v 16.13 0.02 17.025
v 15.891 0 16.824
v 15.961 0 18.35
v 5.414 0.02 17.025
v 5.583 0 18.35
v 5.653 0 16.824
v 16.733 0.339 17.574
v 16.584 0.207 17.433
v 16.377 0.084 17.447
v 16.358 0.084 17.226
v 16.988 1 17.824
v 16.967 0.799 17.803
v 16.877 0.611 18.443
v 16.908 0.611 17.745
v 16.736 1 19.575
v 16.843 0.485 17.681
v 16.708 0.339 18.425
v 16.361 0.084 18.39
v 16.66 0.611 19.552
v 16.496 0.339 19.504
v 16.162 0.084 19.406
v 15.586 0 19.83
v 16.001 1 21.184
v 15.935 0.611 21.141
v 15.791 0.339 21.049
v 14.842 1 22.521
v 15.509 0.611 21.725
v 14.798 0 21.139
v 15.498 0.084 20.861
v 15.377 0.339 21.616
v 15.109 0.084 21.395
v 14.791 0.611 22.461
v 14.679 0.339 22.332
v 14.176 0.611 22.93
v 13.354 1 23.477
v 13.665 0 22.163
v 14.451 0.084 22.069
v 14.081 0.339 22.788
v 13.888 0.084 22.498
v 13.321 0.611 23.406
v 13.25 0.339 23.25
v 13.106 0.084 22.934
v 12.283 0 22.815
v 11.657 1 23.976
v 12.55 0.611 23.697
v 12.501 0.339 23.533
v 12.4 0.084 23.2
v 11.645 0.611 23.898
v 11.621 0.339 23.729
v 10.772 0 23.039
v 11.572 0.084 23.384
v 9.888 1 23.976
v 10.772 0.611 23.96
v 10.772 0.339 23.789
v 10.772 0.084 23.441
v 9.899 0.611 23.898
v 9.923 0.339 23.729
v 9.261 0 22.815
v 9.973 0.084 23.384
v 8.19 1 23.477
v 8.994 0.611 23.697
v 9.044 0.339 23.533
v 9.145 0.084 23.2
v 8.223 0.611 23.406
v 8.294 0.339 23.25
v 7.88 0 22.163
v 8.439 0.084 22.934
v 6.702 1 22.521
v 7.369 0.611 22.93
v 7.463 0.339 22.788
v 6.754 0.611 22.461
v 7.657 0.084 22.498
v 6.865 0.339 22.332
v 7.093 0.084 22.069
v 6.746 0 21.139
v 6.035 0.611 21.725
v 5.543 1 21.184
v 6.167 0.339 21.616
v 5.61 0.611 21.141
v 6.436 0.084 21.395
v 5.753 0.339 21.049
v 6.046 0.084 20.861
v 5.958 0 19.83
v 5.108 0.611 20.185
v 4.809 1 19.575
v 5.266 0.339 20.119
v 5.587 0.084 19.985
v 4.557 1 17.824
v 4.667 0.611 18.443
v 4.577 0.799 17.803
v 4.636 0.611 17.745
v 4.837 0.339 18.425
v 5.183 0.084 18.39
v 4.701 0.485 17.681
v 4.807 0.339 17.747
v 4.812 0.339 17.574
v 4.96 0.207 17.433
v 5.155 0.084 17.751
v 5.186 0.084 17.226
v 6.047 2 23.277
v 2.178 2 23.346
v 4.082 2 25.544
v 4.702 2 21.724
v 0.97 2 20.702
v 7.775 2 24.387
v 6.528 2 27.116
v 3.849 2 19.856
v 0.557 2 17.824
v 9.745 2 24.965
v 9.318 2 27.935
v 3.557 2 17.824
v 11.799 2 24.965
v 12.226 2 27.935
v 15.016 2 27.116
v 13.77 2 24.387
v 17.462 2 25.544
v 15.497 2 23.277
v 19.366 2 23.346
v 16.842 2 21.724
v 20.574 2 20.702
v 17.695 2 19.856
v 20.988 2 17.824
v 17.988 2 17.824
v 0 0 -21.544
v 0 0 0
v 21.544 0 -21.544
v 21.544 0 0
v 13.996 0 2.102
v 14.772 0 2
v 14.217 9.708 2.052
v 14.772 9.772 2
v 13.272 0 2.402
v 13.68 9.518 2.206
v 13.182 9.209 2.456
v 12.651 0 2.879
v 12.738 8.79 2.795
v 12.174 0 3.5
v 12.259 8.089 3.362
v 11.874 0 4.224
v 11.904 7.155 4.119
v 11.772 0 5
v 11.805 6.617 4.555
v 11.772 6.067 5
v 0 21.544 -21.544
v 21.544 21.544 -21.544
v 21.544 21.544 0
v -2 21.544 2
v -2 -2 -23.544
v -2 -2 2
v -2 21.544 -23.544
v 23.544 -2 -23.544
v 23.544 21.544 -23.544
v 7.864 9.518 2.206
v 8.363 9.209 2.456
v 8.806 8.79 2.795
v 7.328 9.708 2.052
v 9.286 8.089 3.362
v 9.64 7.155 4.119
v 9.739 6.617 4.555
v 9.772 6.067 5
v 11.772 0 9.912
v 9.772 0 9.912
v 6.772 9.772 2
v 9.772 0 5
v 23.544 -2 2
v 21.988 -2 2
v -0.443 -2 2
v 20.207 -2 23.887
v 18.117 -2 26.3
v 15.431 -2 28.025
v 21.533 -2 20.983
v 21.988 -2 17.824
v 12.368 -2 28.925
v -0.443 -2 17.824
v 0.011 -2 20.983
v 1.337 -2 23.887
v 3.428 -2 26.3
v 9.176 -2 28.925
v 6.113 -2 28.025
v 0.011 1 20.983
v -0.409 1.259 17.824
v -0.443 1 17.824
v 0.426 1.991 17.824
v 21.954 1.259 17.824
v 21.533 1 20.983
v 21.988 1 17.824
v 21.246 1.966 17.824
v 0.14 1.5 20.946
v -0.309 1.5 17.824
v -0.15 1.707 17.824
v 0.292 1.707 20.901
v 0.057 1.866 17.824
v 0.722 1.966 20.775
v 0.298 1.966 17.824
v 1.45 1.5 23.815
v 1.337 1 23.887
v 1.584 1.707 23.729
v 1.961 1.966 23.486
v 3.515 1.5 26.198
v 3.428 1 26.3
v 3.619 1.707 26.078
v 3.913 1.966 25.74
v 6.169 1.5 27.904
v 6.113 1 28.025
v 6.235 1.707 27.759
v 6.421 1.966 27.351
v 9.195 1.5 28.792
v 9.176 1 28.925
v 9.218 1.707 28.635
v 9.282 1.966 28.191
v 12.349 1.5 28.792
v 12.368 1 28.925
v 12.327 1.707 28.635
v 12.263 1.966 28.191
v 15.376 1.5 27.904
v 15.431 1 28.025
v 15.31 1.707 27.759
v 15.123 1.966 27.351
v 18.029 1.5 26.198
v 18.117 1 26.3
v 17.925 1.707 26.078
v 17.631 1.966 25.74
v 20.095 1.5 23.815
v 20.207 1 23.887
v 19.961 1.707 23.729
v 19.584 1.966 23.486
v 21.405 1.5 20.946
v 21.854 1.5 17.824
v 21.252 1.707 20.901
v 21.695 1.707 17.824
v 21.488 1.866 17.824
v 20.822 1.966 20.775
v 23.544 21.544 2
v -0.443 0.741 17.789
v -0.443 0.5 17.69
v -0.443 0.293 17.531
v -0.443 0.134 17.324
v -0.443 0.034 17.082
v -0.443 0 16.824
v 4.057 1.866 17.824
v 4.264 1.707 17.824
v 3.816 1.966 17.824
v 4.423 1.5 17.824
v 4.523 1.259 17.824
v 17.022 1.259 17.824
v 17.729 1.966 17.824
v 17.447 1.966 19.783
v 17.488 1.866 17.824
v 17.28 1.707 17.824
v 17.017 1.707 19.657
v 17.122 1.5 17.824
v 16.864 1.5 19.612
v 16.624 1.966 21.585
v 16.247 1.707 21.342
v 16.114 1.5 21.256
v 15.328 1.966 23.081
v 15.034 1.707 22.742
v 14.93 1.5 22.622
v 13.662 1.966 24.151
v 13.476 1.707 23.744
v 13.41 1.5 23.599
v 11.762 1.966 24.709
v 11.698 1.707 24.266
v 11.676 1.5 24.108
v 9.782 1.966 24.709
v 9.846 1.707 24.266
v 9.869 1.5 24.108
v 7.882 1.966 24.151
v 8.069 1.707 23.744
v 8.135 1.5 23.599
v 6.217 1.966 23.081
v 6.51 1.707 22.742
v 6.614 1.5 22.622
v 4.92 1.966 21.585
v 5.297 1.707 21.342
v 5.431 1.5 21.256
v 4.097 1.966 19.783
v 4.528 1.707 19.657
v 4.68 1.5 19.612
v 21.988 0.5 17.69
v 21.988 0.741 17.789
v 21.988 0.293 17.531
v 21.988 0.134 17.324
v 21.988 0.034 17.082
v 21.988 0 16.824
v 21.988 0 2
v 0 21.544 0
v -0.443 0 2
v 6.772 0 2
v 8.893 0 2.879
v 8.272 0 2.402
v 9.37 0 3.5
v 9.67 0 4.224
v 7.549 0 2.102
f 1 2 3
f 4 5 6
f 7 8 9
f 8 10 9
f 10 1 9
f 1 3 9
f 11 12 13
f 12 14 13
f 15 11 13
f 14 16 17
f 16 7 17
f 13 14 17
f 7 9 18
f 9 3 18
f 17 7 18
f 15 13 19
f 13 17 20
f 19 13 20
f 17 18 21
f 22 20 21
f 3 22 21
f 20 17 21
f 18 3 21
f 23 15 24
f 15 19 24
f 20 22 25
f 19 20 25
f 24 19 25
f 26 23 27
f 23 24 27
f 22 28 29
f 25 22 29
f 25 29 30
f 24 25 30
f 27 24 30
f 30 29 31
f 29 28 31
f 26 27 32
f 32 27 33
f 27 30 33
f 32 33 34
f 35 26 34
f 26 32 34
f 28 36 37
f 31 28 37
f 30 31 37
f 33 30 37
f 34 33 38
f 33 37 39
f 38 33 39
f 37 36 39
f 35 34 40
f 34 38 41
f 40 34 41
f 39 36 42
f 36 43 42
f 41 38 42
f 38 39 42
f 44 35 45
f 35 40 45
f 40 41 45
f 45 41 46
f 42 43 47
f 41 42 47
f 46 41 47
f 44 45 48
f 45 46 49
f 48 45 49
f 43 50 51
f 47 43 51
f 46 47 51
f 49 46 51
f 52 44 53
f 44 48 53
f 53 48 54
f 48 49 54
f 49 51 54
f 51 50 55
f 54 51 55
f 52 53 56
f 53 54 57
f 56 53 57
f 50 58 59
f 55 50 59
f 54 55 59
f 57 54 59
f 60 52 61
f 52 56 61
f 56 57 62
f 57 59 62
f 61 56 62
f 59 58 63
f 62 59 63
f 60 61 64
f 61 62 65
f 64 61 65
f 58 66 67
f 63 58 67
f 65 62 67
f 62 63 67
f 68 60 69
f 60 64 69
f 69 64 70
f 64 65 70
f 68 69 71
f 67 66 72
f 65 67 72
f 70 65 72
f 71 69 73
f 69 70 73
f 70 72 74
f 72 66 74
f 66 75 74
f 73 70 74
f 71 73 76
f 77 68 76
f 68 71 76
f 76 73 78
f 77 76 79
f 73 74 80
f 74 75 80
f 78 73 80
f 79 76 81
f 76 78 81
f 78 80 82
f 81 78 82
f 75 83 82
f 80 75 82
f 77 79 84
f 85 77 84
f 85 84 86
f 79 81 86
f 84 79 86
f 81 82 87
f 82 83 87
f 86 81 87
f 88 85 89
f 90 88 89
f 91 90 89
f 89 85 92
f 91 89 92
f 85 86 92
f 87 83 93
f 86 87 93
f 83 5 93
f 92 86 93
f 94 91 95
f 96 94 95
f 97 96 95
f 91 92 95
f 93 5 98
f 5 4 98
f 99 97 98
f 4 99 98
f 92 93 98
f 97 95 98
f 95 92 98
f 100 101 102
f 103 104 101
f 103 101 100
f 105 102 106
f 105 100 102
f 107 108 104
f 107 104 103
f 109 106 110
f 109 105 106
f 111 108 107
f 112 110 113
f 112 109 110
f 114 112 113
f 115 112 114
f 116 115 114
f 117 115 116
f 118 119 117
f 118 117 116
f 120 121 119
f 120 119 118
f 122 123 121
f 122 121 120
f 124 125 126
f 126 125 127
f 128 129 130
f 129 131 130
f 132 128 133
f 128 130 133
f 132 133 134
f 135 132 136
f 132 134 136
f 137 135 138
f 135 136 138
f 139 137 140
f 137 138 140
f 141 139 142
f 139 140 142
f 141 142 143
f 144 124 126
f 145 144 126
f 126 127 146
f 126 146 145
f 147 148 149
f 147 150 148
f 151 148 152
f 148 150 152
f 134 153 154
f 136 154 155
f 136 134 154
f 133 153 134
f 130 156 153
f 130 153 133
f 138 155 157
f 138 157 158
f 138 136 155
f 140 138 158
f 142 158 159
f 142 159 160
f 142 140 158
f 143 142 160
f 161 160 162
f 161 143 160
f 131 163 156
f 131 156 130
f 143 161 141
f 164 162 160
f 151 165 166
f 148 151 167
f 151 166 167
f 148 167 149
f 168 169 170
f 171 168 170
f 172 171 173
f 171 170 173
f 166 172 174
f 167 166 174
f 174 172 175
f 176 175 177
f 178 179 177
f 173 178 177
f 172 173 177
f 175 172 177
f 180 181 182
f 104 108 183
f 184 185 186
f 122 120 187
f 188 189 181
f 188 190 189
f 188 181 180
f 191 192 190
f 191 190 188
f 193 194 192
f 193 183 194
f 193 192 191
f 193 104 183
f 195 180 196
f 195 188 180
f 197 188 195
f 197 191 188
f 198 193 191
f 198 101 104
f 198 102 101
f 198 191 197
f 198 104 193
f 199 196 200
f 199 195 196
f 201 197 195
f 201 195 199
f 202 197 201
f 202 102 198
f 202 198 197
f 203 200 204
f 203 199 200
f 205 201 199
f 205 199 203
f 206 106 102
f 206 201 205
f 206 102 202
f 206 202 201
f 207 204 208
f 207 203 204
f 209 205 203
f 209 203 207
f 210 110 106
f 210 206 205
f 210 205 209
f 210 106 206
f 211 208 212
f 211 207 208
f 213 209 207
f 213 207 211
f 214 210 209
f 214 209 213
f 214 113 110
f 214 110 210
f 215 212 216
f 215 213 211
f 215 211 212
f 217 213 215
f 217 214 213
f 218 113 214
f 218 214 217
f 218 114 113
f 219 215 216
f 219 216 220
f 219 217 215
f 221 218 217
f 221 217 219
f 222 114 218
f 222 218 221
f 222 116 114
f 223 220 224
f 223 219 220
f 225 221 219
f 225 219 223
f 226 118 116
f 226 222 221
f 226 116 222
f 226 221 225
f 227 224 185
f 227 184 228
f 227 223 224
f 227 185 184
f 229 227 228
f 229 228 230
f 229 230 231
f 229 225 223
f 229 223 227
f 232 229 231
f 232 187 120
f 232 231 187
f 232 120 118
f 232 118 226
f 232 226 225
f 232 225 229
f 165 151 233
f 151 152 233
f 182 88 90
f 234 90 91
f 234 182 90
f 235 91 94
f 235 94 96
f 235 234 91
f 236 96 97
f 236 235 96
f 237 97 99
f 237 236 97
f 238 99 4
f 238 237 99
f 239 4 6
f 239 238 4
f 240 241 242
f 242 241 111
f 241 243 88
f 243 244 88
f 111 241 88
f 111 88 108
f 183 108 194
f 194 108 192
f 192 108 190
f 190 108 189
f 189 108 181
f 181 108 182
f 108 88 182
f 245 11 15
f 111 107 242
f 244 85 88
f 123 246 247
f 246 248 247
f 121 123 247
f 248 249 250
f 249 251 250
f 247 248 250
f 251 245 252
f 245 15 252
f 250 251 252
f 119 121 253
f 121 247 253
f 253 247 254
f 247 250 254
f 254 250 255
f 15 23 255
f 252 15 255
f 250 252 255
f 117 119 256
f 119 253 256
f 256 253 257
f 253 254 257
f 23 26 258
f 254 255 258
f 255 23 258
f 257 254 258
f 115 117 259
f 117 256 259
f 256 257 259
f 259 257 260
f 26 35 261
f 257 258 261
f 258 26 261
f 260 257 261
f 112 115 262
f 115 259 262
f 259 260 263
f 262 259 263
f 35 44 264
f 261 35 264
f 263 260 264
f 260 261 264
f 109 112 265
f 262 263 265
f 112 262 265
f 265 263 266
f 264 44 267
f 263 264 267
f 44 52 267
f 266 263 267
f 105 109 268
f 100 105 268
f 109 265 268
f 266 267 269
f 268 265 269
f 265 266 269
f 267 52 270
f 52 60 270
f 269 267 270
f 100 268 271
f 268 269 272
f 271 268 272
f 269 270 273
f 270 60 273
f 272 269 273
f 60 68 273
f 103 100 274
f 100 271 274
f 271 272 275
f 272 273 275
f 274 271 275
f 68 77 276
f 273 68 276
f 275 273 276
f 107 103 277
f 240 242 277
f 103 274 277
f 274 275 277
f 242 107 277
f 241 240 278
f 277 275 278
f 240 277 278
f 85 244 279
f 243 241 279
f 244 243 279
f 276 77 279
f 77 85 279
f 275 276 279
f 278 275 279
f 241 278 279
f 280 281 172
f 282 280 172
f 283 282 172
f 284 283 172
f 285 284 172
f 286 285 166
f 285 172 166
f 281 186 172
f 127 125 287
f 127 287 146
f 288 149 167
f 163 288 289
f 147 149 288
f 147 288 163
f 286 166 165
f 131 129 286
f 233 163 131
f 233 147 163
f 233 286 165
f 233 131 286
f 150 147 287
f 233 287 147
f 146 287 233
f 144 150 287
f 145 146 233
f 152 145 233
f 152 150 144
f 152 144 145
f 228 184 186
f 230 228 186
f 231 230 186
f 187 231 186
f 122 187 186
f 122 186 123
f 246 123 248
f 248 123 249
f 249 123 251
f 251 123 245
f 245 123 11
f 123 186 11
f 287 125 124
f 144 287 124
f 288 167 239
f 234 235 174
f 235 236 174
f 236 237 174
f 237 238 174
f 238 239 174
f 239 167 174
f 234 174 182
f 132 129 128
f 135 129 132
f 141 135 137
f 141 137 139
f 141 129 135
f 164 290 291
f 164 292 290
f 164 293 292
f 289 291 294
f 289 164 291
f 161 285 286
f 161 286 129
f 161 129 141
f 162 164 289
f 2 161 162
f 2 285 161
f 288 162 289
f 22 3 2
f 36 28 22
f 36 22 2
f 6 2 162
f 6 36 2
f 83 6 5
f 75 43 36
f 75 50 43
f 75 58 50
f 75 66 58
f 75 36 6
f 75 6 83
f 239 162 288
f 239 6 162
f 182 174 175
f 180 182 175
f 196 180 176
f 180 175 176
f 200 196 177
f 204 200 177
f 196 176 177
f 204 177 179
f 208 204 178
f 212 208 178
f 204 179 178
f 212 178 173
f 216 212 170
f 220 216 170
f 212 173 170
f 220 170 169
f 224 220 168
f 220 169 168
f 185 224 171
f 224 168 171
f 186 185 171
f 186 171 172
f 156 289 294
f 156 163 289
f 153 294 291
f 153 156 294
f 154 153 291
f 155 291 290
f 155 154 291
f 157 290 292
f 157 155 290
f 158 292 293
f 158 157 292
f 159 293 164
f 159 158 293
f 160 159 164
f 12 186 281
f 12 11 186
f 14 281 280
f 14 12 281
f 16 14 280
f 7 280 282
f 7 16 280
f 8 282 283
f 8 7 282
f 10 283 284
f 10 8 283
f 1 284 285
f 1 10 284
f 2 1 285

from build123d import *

# Parameters (mm, degrees)
SKETCH1_W           = 25.5443469
SKETCH1_H           = 25.5443469
SKETCH1_W_2         = 21.5443469
SKETCH1_H_2         = 21.5443469
EXTRUDE_THIN1_DEPTH = 21.5443469
SKETCH2_W           = 25.5443469
SKETCH2_H           = 25.5443469
BOSS_EXTRUDE1_DEPTH = 2
BOSS_EXTRUDE2_DEPTH = 2
BOSS_EXTRUDE3_DEPTH = 1
FILLET2_R           = 3
EXTRUDE_THIN2_DEPTH = 2
FILLET3_R           = 1


with BuildPart() as part:
    # Sketch1 → Extrude-Thin1 (new body)
    with BuildSketch(Plane(origin=(0, 0, 0), x_dir=(1, 0, 0), z_dir=(0, 1, 0))):
        with Locations((10.77217345, 10.77217345)):
            Rectangle(SKETCH1_W, SKETCH1_H)
        with Locations((10.77217345, 10.77217345)):
            Rectangle(SKETCH1_W_2, SKETCH1_H_2, mode=Mode.SUBTRACT)
    extrude(amount=EXTRUDE_THIN1_DEPTH)

    # Sketch2 → Boss-Extrude1 (add)
    with BuildSketch(Plane.XZ):
        with Locations((10.77217345, -10.77217345)):
            Rectangle(SKETCH2_W, SKETCH2_H)
    extrude(amount=BOSS_EXTRUDE1_DEPTH)

    # Sketch4 → Boss-Extrude2 (add)
    with BuildSketch(Plane.XZ.offset(2)):
        with BuildLine():
            Line((-0.443258652, 2), (-0.443258652, 17.823551836))
            ThreePointArc((-0.443258652, 17.823551836), (10.77217345, 29.038983939), (21.987605552, 17.823551836))
            Line((21.987605552, 17.823551836), (21.987605552, 2))
            ThreePointArc((21.987605552, 2), (10.77217345, -9.215432102), (-0.443258652, 2))
        make_face()
    extrude(amount=-BOSS_EXTRUDE2_DEPTH)

    # Sketch5 → Boss-Extrude3 (add, symmetric)
    with BuildSketch(Plane(origin=(10.77217345, 0, 0), x_dir=(0, 0, -1), z_dir=(1, 0, 0))):
        Polygon((-2, 9.77217345), (-9.911775918, 0), (-2, 0), align=None)
    extrude(amount=BOSS_EXTRUDE3_DEPTH, both=True)

    # Fillet2
    fillet2_edges = [part.edges().sort_by_distance(p)[0] for p in [
        (9.77217345, 4.886086725, 2),
        (11.77217345, 4.886086725, 2),
    ]]
    fillet(fillet2_edges, radius=FILLET2_R)

    # Sketch6 → Extrude-Thin2 (add)
    with BuildSketch(Plane(origin=(0, 0, 0), x_dir=(1, 0, 0), z_dir=(0, 1, 0))):
        with BuildLine():
            ThreePointArc((-0.443258652, -17.823551836), (10.77217345, -29.038983939), (21.987605552, -17.823551836))
            Line((21.987605552, -17.823551836), (16.987605552, -17.823551836))
            ThreePointArc((16.987605552, -17.823551836), (10.77217345, -24.038983939), (4.556741348, -17.823551836))
            Line((4.556741348, -17.823551836), (-0.443258652, -17.823551836))
        make_face()
    extrude(amount=EXTRUDE_THIN2_DEPTH)

    # Fillet3
    fillet3_edges = [part.edges().sort_by_distance(p)[0] for p in [
        (19.487605552, 0, 17.823551836),
        (2.056741348, 0, 17.823551836),
        (10.77217345, 2, 29.038983939),
        (10.77217345, 2, 24.038983939),
        (10.77217345, 0, 24.038983939),
    ]]
    fillet(fillet3_edges, radius=FILLET3_R - 0.0001)  # a hair under: the kernel refuses the full size


solid = part.part
